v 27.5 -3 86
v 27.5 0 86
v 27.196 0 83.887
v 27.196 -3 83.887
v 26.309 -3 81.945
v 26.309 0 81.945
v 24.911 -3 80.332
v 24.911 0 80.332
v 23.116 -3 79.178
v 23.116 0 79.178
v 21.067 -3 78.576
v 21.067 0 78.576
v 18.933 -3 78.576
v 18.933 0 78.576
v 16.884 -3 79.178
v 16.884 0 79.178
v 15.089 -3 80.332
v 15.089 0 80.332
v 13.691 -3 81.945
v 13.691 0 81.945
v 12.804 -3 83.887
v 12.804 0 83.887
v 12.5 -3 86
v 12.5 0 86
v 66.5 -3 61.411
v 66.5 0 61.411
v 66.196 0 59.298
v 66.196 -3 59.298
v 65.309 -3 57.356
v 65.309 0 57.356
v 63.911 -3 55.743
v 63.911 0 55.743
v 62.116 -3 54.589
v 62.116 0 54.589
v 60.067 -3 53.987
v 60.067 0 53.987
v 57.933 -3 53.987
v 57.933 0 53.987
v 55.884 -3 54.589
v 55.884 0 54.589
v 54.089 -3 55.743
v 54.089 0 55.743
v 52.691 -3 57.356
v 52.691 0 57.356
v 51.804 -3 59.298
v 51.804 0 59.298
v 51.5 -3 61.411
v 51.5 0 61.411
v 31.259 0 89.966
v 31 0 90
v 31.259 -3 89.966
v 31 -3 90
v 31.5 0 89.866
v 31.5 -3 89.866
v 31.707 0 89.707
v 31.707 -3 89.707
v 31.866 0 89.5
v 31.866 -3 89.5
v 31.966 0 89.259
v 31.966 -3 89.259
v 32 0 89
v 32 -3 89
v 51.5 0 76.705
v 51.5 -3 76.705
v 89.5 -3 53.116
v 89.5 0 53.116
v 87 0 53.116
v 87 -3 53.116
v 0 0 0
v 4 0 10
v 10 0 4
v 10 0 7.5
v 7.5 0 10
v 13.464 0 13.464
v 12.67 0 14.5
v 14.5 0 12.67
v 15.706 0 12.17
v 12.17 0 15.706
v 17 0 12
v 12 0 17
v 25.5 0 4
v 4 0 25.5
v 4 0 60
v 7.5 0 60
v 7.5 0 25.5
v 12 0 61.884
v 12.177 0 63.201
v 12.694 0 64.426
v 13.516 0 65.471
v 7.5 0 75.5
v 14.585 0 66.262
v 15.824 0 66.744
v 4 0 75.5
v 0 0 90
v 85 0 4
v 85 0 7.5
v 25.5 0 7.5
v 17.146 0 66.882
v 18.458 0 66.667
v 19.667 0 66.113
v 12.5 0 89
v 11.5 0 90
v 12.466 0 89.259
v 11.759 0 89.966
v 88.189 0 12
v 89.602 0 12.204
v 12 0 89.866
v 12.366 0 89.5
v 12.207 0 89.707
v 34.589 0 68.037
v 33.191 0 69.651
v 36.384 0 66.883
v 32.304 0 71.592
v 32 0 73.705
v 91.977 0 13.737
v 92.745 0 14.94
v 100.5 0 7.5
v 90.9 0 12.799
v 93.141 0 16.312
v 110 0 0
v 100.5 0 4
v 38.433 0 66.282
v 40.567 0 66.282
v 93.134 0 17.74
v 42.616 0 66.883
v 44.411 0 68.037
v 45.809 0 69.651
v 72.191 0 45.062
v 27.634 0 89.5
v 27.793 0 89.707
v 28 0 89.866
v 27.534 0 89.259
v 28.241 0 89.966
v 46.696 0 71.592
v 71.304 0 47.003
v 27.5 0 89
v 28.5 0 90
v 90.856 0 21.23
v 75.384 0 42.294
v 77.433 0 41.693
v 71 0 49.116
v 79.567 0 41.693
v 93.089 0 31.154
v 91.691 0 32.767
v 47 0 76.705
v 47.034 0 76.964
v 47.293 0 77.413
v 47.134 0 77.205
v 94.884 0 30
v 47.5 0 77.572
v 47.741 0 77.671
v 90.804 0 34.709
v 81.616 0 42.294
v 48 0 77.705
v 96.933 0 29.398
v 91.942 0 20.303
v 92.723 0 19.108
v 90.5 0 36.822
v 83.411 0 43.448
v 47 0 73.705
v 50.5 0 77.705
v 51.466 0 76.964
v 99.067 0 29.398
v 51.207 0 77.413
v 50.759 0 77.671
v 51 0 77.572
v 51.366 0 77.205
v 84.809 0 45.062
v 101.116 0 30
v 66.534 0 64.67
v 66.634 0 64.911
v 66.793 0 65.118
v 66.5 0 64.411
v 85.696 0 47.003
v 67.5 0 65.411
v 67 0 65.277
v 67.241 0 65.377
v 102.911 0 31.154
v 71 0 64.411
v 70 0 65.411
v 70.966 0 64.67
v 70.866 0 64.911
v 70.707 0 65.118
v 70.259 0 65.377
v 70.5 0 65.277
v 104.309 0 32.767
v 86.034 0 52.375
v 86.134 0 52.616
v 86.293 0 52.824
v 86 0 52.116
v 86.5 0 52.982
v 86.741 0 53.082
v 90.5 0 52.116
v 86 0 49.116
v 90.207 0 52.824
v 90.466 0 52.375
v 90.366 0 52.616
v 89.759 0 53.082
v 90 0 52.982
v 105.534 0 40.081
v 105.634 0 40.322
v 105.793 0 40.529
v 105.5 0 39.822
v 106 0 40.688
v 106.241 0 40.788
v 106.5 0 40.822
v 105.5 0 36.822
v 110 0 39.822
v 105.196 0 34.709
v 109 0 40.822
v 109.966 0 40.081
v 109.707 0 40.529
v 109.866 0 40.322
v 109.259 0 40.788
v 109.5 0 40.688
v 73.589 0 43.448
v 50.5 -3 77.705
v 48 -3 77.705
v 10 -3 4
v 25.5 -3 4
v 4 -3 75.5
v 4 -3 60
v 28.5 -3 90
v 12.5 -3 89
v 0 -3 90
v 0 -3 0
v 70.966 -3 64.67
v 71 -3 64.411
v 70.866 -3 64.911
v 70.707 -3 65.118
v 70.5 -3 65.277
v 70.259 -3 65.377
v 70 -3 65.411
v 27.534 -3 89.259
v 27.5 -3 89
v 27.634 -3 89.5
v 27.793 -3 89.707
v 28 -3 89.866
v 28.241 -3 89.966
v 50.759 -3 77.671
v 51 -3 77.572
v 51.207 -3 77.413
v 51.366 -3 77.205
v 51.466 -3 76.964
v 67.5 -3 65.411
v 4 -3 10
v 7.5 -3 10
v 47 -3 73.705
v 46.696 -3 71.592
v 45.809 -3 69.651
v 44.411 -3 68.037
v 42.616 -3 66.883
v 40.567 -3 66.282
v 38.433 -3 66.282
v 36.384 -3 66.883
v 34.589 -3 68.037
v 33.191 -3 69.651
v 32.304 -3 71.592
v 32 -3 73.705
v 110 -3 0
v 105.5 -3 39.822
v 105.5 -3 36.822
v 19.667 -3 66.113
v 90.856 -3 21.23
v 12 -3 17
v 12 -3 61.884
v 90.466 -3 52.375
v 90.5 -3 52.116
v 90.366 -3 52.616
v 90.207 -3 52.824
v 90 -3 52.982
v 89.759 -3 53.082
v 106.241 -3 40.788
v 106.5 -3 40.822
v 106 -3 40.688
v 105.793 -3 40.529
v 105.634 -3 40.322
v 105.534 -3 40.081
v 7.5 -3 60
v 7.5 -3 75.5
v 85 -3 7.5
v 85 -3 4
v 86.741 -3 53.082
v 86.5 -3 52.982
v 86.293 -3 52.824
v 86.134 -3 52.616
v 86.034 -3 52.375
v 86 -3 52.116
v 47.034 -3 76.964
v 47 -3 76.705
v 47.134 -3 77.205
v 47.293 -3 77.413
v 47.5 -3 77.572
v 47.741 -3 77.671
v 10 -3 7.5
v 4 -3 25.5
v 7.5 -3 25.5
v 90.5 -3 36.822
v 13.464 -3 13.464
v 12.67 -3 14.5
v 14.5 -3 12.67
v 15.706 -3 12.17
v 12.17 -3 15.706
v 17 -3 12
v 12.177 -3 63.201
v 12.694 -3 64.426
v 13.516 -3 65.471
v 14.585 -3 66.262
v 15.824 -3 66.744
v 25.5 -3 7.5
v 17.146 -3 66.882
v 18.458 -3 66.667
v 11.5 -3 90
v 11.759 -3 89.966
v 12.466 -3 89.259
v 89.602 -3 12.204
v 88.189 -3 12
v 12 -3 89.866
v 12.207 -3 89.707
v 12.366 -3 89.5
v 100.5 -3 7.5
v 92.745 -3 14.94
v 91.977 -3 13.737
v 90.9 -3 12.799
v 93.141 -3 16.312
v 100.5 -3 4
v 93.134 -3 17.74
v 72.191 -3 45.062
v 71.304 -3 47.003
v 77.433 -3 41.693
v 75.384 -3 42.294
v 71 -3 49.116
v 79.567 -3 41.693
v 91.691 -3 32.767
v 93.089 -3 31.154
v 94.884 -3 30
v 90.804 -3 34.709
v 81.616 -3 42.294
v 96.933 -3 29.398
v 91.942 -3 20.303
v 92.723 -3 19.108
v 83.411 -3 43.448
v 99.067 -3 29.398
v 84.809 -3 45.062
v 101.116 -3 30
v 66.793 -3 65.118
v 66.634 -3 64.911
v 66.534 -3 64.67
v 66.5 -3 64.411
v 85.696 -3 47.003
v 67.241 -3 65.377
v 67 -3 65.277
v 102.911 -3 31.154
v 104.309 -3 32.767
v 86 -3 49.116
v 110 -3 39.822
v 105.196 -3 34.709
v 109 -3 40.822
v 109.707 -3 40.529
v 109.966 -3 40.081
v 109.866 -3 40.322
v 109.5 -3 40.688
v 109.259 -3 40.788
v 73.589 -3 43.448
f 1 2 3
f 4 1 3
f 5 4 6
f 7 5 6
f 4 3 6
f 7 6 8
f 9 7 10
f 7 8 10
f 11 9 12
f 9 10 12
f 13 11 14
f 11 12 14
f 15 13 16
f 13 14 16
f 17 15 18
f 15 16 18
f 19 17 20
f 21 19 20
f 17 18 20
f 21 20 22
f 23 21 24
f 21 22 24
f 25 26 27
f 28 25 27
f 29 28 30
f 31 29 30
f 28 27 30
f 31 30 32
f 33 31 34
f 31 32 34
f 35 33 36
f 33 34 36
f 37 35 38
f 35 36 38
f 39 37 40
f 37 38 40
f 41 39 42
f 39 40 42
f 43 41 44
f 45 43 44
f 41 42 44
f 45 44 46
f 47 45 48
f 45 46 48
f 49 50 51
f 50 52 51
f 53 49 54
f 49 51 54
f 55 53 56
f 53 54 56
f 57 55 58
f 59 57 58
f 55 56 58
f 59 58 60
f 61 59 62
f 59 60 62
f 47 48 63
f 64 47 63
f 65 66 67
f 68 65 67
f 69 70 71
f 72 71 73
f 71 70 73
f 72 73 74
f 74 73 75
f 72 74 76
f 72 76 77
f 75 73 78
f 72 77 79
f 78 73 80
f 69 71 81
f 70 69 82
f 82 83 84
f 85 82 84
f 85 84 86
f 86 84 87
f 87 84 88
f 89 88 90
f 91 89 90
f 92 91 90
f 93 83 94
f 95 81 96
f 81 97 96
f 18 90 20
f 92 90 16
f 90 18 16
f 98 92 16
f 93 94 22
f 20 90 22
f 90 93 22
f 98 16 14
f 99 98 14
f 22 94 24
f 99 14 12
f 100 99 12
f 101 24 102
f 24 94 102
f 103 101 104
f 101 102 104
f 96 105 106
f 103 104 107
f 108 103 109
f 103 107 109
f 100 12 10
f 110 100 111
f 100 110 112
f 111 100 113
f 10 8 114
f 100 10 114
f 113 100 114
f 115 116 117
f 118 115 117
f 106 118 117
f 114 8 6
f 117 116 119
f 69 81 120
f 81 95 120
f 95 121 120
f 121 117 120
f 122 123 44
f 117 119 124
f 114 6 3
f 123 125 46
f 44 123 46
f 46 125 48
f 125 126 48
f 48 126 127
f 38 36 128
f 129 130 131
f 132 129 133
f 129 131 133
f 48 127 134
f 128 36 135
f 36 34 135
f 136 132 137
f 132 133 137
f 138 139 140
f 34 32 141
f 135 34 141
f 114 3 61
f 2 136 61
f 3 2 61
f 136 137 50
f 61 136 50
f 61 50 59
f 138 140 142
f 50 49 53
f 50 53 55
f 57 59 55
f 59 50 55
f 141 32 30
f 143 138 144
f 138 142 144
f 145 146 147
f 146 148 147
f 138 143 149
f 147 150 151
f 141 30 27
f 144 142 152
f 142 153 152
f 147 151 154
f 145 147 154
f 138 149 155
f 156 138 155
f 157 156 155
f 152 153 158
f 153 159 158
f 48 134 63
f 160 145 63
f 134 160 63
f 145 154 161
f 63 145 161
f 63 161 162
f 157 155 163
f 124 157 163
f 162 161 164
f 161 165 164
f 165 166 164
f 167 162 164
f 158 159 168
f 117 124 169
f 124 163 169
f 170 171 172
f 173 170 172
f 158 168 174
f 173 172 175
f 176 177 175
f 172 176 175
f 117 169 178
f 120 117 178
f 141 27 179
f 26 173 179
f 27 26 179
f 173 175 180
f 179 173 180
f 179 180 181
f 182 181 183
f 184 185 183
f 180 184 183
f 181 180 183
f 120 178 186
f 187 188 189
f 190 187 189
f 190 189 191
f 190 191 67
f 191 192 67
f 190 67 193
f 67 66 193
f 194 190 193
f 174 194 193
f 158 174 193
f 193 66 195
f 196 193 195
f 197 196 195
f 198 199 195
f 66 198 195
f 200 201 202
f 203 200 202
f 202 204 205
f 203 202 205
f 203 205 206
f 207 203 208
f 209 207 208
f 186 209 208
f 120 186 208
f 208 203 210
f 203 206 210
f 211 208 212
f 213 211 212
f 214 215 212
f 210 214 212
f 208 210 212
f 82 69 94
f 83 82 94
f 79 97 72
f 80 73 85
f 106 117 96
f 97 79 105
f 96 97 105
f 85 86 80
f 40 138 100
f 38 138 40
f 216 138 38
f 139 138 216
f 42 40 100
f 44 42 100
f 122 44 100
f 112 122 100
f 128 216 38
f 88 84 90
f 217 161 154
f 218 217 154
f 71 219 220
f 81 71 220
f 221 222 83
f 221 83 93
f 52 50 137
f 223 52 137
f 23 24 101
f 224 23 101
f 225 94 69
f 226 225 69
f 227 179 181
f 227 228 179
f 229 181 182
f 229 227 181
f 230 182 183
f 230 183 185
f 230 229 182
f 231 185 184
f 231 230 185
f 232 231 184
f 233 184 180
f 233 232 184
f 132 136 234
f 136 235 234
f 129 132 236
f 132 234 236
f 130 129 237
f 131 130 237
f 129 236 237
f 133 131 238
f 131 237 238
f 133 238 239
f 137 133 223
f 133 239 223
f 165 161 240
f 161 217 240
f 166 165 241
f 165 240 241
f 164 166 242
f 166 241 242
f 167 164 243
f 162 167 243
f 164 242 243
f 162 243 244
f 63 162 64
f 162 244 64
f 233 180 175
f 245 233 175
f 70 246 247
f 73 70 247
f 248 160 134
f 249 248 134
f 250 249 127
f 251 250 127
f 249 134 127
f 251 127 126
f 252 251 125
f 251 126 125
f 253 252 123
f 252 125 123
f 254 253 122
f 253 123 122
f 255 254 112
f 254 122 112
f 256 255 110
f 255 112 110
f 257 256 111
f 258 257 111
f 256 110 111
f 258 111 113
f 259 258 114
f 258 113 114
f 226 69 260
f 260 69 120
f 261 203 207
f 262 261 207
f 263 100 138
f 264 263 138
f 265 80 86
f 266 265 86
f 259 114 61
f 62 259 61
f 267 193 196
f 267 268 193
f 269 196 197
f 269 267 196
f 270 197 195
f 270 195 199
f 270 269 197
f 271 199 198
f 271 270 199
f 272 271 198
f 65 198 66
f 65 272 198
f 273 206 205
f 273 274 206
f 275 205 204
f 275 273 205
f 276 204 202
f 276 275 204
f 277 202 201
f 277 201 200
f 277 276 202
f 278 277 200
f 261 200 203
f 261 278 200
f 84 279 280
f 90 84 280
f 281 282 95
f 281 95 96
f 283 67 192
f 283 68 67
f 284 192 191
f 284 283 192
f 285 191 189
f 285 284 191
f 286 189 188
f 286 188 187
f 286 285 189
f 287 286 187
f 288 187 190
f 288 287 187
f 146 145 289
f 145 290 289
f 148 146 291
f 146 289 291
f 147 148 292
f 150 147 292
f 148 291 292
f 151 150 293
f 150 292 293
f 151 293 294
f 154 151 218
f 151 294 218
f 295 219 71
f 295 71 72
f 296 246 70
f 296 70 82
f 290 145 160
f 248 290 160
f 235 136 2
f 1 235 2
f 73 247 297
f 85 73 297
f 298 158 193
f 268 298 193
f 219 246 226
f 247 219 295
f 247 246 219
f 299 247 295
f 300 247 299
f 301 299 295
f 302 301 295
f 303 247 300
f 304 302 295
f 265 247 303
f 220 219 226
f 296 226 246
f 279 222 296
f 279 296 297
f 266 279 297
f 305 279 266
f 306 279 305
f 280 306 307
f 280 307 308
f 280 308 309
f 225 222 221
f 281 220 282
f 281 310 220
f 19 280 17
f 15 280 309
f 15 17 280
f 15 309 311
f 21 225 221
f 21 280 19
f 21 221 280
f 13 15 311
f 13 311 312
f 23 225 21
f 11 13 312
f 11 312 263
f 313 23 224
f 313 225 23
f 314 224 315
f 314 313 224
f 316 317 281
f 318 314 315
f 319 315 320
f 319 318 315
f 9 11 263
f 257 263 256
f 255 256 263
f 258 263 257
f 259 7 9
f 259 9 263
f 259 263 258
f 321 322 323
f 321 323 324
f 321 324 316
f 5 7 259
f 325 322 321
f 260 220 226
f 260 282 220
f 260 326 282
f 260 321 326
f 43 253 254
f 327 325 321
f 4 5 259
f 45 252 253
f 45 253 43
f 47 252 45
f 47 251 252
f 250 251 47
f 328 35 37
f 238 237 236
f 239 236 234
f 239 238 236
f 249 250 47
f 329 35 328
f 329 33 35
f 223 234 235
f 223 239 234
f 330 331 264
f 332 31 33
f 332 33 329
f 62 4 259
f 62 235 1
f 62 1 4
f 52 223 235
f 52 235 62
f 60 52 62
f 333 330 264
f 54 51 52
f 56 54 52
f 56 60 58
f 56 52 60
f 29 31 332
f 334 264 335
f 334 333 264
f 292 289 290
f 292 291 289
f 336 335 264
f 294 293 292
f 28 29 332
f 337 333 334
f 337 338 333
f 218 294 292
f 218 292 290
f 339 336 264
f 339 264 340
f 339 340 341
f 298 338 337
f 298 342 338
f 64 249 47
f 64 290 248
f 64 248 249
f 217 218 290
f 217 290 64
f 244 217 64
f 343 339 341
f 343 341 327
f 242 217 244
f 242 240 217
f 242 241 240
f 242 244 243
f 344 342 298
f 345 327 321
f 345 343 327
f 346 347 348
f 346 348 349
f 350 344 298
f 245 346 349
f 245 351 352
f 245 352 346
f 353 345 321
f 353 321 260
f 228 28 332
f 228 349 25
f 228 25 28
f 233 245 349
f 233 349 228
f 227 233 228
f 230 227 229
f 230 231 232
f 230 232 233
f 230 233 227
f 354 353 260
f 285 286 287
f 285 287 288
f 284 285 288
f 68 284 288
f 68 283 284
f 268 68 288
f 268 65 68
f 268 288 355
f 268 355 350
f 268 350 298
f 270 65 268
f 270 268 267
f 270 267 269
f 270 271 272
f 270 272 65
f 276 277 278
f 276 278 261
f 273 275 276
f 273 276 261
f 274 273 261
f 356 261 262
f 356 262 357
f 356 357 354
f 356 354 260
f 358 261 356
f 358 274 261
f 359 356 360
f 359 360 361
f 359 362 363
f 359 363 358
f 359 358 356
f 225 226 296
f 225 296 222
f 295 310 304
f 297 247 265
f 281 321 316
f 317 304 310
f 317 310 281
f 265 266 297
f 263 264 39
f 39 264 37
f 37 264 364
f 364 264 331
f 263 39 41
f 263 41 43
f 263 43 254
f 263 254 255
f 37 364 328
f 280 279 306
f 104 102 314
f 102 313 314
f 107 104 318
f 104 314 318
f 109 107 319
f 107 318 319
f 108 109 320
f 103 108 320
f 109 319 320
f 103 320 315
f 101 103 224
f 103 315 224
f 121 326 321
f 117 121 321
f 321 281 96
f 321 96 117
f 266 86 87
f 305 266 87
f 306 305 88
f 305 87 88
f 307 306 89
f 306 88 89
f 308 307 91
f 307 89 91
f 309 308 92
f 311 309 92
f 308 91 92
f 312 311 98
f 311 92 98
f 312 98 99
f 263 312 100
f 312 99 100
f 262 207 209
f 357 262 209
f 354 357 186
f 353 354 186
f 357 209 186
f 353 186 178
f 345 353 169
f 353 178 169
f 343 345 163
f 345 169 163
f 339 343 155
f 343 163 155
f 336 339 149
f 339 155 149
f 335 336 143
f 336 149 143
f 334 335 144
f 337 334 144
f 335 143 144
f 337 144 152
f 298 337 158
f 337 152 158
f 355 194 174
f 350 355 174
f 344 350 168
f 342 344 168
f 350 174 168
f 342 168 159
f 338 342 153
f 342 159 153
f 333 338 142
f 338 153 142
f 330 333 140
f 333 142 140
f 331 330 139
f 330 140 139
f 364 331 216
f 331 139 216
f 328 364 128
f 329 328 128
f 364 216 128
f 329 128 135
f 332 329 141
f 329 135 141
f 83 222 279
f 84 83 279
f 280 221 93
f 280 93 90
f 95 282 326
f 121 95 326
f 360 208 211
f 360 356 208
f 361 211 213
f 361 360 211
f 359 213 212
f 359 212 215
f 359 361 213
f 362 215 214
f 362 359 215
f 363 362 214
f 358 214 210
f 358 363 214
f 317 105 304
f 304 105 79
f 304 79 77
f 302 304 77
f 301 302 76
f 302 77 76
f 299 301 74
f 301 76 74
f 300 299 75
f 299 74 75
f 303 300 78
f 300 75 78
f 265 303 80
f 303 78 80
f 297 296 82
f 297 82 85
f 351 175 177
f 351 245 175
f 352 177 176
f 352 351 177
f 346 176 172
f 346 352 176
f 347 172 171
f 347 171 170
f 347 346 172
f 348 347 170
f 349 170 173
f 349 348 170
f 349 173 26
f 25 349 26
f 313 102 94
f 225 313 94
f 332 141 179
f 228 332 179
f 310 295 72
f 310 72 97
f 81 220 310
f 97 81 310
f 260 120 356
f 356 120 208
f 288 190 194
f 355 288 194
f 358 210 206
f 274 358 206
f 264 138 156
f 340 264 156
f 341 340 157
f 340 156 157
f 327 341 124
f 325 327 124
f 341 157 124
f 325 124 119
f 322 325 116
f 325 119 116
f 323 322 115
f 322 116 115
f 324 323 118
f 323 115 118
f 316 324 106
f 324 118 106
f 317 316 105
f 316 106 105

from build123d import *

# Parameters (mm, degrees)
F1_DEPTH = 3
F2_R     = 1
F3_W     = 15.5
F3_H     = 3.5
F3_W_2   = 3.5
F3_H_2   = 15.5
F4_DEPTH = 25


with BuildPart() as f1:
    # F0 (on Front) → F1 (new body)
    with BuildSketch(Plane.XZ):
        with BuildLine():
            Line((0, 90), (0, 0))
            Line((0, 0), (110, 0))
            Line((110, 0), (110, 40.821911))
            Line((110, 40.821911), (105.5, 40.821911))
            Line((105.5, 40.821911), (105.5, 36.821911))
            ThreePointArc((105.5, 36.821911), (98, 29.321911), (90.5, 36.821911))
            Line((90.5, 36.821911), (90.5, 53.116433))
            Line((90.5, 53.116433), (86, 53.116433))
            Line((86, 53.116433), (86, 49.116433))
            ThreePointArc((86, 49.116433), (78.5, 41.616433), (71, 49.116433))
            Line((71, 49.116433), (71, 65.410955))
            Line((71, 65.410955), (66.5, 65.410955))
            Line((66.5, 65.410955), (66.5, 61.410955))
            ThreePointArc((66.5, 61.410955), (59, 53.910955), (51.5, 61.410955))
            Line((51.5, 61.410955), (51.5, 77.705478))
            Line((51.5, 77.705478), (47, 77.705478))
            Line((47, 77.705478), (47, 73.705478))
            ThreePointArc((47, 73.705478), (39.5, 66.205478), (32, 73.705478))
            Line((32, 73.705478), (32, 90))
            Line((32, 90), (27.5, 90))
            Line((27.5, 90), (27.5, 86))
            ThreePointArc((27.5, 86), (20, 78.5), (12.5, 86))
            Line((12.5, 86), (12.5, 90))
            Line((12.5, 90), (0, 90))
        make_face()
        with BuildLine():
            ThreePointArc((17, 12), (13.464466, 13.464466), (12, 17))
            Line((12, 17), (12, 61.883822))
            ThreePointArc((12, 61.883822), (14.584771, 66.261797), (19.666667, 66.113347))
            Line((19.666667, 66.113347), (90.855648, 21.229526))
            ThreePointArc((90.855648, 21.229526), (92.992502, 15.612129), (88.188981, 12))
            Line((88.188981, 12), (17, 12))
        make_face(mode=Mode.SUBTRACT)
    extrude(amount=F1_DEPTH)

    # F2
    f2_edges = [f1.edges().sort_by_distance(p)[0] for p in [
        (12.5, -1.5, 90),
        (27.5, -1.5, 90),
        (32, -1.5, 90),
        (47, -1.5, 77.705478),
        (51.5, -1.5, 77.705478),
        (66.5, -1.5, 65.410955),
        (71, -1.5, 65.410955),
        (110, -1.5, 40.821911),
        (105.5, -1.5, 40.821911),
        (90.5, -1.5, 53.116433),
        (86, -1.5, 53.116433),
    ]]
    fillet(f2_edges, radius=F2_R)

    # F3 (on face) → F4 (cut)
    with BuildSketch(Plane.XZ.offset(3)):
        with Locations((17.75, 5.75)):
            Rectangle(F3_W, F3_H)
        with Locations((92.75, 5.75)):
            Rectangle(F3_W, F3_H)
        with Locations((5.75, 17.75)):
            Rectangle(F3_W_2, F3_H_2)
        with Locations((5.75, 67.75)):
            Rectangle(F3_W_2, F3_H_2)
    extrude(amount=-F4_DEPTH, mode=Mode.SUBTRACT)


solid = f1.part
